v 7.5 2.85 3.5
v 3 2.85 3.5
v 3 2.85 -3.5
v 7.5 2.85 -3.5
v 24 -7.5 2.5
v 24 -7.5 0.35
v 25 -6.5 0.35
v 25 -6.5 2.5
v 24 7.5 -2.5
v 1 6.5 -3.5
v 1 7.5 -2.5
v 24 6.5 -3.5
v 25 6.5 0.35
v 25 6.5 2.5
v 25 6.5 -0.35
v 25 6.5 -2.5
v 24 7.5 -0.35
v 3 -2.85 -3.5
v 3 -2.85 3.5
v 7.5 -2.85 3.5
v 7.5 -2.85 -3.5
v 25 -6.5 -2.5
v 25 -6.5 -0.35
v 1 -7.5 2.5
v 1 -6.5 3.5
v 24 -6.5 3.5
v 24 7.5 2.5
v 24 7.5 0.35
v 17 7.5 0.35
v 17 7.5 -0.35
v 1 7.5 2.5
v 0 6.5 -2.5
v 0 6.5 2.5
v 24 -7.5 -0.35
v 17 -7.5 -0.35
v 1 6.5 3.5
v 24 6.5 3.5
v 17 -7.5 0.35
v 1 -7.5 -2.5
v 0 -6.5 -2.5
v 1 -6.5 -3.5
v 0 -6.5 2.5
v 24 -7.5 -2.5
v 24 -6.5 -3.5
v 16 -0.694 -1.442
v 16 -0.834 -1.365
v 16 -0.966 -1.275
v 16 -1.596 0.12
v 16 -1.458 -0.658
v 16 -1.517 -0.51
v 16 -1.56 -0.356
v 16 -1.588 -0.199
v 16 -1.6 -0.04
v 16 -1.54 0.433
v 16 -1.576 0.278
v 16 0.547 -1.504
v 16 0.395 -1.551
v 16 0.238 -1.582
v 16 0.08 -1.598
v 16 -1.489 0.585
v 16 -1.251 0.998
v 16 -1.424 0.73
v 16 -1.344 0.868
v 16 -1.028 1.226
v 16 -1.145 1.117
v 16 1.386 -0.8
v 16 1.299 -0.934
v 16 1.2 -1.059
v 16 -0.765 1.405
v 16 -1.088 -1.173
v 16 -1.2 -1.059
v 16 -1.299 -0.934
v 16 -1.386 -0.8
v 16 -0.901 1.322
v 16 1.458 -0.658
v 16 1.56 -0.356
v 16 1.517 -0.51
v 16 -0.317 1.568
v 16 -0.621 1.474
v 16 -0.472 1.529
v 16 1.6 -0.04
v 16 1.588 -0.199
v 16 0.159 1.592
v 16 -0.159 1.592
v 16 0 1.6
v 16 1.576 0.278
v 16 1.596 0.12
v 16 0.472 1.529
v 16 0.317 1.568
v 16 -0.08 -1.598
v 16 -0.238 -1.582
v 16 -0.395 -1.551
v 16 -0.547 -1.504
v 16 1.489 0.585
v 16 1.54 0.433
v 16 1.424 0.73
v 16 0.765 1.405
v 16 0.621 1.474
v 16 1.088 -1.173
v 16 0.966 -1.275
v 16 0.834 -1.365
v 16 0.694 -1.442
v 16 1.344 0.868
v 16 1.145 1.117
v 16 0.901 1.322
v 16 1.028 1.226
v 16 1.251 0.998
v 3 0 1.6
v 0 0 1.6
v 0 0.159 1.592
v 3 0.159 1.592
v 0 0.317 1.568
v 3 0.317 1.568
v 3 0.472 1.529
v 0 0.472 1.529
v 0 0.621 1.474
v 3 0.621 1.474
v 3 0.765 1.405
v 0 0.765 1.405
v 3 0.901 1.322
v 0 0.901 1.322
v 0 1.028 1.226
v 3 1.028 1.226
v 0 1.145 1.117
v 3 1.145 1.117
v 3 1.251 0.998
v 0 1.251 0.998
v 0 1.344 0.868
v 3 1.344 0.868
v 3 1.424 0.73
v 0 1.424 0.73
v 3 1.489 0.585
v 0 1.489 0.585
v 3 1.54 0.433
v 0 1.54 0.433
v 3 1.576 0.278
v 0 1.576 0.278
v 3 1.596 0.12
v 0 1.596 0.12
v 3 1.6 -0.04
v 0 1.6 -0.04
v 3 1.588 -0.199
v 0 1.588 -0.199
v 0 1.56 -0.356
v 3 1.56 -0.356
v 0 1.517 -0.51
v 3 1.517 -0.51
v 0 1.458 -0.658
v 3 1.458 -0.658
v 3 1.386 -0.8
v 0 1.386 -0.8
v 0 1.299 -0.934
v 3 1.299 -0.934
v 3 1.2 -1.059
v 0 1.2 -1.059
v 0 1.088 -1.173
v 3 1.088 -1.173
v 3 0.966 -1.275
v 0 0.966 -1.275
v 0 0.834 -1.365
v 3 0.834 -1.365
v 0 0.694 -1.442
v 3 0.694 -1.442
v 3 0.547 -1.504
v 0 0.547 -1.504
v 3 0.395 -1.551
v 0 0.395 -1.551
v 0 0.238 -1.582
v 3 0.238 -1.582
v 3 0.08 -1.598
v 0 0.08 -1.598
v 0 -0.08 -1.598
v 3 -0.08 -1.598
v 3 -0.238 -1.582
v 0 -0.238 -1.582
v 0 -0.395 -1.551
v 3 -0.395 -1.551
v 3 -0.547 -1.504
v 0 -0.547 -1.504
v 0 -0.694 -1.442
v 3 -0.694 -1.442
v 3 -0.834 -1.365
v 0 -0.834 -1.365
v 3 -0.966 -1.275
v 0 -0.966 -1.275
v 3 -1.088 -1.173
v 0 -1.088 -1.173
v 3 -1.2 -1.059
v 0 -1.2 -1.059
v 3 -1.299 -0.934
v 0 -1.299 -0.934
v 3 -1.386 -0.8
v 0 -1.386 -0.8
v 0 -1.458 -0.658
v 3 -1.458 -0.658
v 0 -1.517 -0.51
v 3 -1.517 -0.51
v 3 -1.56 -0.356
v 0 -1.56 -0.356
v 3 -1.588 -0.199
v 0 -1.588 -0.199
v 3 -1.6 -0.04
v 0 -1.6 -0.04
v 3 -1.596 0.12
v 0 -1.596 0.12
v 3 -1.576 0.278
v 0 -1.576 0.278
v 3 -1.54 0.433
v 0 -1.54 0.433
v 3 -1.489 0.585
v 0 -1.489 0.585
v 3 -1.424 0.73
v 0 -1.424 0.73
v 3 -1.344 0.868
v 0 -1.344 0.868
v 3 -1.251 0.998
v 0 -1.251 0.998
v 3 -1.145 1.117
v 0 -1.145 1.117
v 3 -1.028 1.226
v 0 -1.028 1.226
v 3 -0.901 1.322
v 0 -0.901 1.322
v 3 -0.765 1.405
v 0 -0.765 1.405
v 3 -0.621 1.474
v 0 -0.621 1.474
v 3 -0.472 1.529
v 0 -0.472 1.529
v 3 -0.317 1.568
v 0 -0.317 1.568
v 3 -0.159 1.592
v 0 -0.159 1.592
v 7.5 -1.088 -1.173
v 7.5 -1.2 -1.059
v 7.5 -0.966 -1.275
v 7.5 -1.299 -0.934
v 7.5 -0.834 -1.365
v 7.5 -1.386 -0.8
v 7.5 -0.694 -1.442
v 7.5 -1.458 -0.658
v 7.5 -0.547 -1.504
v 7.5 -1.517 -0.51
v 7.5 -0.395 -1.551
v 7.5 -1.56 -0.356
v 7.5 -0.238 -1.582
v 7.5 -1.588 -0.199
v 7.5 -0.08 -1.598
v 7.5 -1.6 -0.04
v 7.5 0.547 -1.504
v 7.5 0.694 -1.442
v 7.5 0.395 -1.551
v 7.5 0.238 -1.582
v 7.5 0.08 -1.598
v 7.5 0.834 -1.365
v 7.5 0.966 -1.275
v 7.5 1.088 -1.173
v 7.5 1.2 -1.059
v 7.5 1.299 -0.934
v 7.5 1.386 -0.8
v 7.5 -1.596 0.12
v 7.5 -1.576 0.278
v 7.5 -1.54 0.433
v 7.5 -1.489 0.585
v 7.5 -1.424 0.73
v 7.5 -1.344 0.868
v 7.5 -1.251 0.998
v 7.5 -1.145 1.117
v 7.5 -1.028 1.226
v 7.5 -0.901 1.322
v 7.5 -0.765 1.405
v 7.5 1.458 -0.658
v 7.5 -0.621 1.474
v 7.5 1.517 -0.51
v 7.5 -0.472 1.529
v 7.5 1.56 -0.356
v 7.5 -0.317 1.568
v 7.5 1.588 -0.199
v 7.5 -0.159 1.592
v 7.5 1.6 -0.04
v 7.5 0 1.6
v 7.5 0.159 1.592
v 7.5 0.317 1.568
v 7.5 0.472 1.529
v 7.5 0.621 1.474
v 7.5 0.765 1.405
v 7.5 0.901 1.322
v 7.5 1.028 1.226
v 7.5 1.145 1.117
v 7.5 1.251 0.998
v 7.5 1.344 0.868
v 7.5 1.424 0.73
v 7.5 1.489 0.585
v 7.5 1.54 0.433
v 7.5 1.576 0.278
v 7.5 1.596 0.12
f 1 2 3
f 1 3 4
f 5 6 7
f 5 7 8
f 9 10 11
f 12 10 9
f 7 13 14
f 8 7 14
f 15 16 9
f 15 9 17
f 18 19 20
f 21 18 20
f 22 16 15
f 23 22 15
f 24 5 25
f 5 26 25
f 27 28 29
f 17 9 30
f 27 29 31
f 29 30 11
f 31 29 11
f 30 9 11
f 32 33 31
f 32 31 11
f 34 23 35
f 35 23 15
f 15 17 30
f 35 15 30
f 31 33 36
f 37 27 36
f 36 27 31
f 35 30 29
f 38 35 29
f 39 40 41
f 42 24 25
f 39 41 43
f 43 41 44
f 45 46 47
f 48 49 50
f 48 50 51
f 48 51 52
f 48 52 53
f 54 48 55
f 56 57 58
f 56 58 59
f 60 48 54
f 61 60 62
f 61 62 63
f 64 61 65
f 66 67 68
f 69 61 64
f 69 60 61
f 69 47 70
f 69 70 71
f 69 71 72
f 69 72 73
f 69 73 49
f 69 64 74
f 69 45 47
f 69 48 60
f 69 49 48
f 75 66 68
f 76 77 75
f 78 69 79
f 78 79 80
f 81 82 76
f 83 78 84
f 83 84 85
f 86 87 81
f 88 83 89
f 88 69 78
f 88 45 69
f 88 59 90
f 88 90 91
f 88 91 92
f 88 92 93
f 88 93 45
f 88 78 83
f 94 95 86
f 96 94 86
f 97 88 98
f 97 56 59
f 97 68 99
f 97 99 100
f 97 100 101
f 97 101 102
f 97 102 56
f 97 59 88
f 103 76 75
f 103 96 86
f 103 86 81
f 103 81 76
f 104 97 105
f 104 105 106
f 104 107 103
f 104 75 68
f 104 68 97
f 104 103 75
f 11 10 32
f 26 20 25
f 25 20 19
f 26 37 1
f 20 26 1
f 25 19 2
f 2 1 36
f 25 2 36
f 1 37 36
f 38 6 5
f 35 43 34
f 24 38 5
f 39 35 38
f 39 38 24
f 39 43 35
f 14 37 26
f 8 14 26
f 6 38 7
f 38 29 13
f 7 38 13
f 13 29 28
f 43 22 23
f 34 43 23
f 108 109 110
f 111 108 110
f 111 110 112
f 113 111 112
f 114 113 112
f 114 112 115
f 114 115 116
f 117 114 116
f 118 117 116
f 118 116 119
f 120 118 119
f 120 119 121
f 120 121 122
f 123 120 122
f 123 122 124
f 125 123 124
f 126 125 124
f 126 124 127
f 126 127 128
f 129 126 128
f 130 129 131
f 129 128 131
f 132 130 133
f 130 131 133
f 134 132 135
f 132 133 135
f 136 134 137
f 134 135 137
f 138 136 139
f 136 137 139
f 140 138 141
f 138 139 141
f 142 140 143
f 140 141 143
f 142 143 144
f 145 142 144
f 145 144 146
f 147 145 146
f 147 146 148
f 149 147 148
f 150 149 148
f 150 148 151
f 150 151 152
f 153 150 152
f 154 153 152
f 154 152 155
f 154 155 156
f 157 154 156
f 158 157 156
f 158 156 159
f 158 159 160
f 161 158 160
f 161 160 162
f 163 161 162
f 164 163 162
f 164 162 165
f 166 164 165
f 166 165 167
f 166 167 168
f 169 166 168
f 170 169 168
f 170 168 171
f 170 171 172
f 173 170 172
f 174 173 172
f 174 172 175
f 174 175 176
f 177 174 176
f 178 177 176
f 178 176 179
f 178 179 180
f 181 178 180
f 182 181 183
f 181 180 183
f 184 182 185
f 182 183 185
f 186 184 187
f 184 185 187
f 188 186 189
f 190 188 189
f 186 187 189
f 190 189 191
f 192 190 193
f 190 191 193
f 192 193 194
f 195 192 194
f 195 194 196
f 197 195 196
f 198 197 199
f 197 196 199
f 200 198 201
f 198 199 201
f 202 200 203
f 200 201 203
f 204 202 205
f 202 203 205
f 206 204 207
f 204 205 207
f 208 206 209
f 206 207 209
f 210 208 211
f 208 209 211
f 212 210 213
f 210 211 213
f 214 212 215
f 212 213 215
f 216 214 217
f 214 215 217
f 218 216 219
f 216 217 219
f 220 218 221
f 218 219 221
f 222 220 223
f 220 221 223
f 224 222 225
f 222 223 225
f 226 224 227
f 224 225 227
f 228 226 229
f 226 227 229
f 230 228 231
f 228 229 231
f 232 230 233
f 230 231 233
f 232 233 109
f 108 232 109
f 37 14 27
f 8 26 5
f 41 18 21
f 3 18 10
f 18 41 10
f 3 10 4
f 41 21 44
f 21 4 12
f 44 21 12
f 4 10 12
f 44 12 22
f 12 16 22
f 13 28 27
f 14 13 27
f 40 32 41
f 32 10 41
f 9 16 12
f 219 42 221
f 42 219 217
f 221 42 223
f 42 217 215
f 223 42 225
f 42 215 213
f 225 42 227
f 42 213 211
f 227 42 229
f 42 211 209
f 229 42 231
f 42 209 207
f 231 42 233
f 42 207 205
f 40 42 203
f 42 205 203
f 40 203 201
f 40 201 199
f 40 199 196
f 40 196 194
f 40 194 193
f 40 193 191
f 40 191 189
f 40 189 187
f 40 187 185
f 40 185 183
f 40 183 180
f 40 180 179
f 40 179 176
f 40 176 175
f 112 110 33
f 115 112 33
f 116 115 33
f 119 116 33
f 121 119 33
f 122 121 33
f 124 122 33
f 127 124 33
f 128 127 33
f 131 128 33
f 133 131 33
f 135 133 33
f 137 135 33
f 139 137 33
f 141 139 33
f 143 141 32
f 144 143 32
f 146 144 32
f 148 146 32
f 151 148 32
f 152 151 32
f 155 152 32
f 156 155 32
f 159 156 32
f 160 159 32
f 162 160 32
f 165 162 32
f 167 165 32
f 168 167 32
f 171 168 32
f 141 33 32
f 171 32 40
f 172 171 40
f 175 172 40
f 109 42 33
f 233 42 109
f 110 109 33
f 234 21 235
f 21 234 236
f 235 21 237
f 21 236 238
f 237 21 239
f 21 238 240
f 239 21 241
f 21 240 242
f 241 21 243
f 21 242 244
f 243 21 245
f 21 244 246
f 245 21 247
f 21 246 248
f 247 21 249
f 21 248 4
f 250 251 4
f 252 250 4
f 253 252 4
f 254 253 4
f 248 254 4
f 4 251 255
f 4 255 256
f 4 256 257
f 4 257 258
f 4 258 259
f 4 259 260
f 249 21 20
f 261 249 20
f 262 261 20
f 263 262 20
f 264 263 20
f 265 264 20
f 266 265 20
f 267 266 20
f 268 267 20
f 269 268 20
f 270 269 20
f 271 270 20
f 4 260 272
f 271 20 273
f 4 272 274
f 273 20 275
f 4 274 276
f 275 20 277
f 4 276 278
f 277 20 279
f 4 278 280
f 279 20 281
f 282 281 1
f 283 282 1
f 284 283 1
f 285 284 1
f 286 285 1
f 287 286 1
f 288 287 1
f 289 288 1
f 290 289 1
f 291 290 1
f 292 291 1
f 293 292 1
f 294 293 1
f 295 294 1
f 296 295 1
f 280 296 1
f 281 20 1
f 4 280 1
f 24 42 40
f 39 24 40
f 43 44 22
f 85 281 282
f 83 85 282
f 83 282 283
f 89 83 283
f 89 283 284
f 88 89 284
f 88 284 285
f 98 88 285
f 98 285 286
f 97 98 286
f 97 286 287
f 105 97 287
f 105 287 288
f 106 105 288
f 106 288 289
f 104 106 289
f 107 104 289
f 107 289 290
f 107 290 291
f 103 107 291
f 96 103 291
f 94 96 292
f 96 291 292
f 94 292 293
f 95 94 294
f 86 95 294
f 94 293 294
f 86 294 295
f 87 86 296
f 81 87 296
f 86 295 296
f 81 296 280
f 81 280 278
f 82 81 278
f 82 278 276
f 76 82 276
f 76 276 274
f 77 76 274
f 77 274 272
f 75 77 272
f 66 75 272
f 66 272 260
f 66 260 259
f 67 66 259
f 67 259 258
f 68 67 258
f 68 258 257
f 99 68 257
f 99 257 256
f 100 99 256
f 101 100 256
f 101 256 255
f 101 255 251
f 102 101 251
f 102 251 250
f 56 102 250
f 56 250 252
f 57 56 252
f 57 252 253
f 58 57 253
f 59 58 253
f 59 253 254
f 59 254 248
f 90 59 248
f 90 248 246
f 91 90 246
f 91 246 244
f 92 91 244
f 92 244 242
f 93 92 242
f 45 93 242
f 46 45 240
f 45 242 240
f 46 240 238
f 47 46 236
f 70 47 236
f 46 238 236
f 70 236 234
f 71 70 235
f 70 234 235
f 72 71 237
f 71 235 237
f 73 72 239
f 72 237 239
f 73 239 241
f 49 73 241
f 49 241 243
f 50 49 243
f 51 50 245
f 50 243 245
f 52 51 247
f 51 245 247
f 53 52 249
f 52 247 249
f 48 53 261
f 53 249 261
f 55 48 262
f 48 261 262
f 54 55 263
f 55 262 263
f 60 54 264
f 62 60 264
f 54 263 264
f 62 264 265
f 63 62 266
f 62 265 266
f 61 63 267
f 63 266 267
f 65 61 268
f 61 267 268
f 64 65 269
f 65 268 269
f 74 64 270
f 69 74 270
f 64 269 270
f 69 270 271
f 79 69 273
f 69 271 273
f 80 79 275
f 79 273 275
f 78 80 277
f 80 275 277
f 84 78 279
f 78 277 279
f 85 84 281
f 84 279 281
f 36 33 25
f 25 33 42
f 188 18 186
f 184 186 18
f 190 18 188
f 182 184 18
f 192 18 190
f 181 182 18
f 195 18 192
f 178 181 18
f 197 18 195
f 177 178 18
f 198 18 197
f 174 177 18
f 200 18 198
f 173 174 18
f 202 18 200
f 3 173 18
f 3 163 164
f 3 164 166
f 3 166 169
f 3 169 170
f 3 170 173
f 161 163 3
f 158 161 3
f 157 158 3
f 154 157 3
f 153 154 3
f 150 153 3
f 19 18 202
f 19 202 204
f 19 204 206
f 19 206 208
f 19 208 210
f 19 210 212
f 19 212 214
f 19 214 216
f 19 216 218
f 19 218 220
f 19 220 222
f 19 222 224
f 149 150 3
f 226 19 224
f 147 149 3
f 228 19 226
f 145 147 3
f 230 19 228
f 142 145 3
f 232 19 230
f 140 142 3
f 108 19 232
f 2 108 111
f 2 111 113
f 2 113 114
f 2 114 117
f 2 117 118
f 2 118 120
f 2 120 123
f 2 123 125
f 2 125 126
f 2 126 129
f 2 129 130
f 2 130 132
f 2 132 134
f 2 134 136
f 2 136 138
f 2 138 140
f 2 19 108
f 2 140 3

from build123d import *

# Parameters (mm, degrees)
BOSS_EXTRUDE1_DEPTH = 7.5
SKETCH3_R           = 1.6
CUT_EXTRUDE1_DEPTH  = 16
SKETCH4_W           = 4.5
SKETCH4_H           = 5.7
CUT_EXTRUDE2_DEPTH  = 28.023138234
CHAMFER1_SIZE       = 1


with BuildPart() as part:
    # Sketch2 → Boss-Extrude1 (new, symmetric)
    with BuildSketch(Plane(origin=(0, 0, 0), x_dir=(1, 0, 0), z_dir=(0, 1, 0))):
        Polygon((25, -0.35), (25, -3.5), (0, -3.5), (0, 3.5), (25, 3.5), (25, 0.35), (17, 0.35), (17, -0.35), align=None)
    extrude(amount=BOSS_EXTRUDE1_DEPTH, both=True)

    # Sketch3 → Cut-Extrude1 (cut)
    with BuildSketch(Plane.ZY):
        Circle(SKETCH3_R)
    extrude(amount=-CUT_EXTRUDE1_DEPTH, mode=Mode.SUBTRACT)

    # Sketch4 → Cut-Extrude2 (cut, through all)
    with BuildSketch(Plane.XY.offset(3.5)):
        with Locations((5.25, 0)):
            Rectangle(SKETCH4_W, SKETCH4_H)
    extrude(amount=-CUT_EXTRUDE2_DEPTH, mode=Mode.SUBTRACT)

    # Chamfer1
    chamfer1_edges = [part.edges().sort_by_distance(p)[0] for p in [
        (25, 7.5, 1.925),
        (12.5, -7.5, 3.5),
        (0, -7.5, 0),
        (0, 0, -3.5),
        (25, 0, -3.5),
        (25, 0, 3.5),
        (0, 0, 3.5),
        (25, 7.5, -1.925),
        (12.5, 7.5, -3.5),
        (0, 7.5, 0),
        (12.5, 7.5, 3.5),
        (12.5, -7.5, -3.5),
        (25, -7.5, -1.925),
        (25, -7.5, 1.925),
    ]]
    chamfer(chamfer1_edges, length=CHAMFER1_SIZE)


solid = part.part
